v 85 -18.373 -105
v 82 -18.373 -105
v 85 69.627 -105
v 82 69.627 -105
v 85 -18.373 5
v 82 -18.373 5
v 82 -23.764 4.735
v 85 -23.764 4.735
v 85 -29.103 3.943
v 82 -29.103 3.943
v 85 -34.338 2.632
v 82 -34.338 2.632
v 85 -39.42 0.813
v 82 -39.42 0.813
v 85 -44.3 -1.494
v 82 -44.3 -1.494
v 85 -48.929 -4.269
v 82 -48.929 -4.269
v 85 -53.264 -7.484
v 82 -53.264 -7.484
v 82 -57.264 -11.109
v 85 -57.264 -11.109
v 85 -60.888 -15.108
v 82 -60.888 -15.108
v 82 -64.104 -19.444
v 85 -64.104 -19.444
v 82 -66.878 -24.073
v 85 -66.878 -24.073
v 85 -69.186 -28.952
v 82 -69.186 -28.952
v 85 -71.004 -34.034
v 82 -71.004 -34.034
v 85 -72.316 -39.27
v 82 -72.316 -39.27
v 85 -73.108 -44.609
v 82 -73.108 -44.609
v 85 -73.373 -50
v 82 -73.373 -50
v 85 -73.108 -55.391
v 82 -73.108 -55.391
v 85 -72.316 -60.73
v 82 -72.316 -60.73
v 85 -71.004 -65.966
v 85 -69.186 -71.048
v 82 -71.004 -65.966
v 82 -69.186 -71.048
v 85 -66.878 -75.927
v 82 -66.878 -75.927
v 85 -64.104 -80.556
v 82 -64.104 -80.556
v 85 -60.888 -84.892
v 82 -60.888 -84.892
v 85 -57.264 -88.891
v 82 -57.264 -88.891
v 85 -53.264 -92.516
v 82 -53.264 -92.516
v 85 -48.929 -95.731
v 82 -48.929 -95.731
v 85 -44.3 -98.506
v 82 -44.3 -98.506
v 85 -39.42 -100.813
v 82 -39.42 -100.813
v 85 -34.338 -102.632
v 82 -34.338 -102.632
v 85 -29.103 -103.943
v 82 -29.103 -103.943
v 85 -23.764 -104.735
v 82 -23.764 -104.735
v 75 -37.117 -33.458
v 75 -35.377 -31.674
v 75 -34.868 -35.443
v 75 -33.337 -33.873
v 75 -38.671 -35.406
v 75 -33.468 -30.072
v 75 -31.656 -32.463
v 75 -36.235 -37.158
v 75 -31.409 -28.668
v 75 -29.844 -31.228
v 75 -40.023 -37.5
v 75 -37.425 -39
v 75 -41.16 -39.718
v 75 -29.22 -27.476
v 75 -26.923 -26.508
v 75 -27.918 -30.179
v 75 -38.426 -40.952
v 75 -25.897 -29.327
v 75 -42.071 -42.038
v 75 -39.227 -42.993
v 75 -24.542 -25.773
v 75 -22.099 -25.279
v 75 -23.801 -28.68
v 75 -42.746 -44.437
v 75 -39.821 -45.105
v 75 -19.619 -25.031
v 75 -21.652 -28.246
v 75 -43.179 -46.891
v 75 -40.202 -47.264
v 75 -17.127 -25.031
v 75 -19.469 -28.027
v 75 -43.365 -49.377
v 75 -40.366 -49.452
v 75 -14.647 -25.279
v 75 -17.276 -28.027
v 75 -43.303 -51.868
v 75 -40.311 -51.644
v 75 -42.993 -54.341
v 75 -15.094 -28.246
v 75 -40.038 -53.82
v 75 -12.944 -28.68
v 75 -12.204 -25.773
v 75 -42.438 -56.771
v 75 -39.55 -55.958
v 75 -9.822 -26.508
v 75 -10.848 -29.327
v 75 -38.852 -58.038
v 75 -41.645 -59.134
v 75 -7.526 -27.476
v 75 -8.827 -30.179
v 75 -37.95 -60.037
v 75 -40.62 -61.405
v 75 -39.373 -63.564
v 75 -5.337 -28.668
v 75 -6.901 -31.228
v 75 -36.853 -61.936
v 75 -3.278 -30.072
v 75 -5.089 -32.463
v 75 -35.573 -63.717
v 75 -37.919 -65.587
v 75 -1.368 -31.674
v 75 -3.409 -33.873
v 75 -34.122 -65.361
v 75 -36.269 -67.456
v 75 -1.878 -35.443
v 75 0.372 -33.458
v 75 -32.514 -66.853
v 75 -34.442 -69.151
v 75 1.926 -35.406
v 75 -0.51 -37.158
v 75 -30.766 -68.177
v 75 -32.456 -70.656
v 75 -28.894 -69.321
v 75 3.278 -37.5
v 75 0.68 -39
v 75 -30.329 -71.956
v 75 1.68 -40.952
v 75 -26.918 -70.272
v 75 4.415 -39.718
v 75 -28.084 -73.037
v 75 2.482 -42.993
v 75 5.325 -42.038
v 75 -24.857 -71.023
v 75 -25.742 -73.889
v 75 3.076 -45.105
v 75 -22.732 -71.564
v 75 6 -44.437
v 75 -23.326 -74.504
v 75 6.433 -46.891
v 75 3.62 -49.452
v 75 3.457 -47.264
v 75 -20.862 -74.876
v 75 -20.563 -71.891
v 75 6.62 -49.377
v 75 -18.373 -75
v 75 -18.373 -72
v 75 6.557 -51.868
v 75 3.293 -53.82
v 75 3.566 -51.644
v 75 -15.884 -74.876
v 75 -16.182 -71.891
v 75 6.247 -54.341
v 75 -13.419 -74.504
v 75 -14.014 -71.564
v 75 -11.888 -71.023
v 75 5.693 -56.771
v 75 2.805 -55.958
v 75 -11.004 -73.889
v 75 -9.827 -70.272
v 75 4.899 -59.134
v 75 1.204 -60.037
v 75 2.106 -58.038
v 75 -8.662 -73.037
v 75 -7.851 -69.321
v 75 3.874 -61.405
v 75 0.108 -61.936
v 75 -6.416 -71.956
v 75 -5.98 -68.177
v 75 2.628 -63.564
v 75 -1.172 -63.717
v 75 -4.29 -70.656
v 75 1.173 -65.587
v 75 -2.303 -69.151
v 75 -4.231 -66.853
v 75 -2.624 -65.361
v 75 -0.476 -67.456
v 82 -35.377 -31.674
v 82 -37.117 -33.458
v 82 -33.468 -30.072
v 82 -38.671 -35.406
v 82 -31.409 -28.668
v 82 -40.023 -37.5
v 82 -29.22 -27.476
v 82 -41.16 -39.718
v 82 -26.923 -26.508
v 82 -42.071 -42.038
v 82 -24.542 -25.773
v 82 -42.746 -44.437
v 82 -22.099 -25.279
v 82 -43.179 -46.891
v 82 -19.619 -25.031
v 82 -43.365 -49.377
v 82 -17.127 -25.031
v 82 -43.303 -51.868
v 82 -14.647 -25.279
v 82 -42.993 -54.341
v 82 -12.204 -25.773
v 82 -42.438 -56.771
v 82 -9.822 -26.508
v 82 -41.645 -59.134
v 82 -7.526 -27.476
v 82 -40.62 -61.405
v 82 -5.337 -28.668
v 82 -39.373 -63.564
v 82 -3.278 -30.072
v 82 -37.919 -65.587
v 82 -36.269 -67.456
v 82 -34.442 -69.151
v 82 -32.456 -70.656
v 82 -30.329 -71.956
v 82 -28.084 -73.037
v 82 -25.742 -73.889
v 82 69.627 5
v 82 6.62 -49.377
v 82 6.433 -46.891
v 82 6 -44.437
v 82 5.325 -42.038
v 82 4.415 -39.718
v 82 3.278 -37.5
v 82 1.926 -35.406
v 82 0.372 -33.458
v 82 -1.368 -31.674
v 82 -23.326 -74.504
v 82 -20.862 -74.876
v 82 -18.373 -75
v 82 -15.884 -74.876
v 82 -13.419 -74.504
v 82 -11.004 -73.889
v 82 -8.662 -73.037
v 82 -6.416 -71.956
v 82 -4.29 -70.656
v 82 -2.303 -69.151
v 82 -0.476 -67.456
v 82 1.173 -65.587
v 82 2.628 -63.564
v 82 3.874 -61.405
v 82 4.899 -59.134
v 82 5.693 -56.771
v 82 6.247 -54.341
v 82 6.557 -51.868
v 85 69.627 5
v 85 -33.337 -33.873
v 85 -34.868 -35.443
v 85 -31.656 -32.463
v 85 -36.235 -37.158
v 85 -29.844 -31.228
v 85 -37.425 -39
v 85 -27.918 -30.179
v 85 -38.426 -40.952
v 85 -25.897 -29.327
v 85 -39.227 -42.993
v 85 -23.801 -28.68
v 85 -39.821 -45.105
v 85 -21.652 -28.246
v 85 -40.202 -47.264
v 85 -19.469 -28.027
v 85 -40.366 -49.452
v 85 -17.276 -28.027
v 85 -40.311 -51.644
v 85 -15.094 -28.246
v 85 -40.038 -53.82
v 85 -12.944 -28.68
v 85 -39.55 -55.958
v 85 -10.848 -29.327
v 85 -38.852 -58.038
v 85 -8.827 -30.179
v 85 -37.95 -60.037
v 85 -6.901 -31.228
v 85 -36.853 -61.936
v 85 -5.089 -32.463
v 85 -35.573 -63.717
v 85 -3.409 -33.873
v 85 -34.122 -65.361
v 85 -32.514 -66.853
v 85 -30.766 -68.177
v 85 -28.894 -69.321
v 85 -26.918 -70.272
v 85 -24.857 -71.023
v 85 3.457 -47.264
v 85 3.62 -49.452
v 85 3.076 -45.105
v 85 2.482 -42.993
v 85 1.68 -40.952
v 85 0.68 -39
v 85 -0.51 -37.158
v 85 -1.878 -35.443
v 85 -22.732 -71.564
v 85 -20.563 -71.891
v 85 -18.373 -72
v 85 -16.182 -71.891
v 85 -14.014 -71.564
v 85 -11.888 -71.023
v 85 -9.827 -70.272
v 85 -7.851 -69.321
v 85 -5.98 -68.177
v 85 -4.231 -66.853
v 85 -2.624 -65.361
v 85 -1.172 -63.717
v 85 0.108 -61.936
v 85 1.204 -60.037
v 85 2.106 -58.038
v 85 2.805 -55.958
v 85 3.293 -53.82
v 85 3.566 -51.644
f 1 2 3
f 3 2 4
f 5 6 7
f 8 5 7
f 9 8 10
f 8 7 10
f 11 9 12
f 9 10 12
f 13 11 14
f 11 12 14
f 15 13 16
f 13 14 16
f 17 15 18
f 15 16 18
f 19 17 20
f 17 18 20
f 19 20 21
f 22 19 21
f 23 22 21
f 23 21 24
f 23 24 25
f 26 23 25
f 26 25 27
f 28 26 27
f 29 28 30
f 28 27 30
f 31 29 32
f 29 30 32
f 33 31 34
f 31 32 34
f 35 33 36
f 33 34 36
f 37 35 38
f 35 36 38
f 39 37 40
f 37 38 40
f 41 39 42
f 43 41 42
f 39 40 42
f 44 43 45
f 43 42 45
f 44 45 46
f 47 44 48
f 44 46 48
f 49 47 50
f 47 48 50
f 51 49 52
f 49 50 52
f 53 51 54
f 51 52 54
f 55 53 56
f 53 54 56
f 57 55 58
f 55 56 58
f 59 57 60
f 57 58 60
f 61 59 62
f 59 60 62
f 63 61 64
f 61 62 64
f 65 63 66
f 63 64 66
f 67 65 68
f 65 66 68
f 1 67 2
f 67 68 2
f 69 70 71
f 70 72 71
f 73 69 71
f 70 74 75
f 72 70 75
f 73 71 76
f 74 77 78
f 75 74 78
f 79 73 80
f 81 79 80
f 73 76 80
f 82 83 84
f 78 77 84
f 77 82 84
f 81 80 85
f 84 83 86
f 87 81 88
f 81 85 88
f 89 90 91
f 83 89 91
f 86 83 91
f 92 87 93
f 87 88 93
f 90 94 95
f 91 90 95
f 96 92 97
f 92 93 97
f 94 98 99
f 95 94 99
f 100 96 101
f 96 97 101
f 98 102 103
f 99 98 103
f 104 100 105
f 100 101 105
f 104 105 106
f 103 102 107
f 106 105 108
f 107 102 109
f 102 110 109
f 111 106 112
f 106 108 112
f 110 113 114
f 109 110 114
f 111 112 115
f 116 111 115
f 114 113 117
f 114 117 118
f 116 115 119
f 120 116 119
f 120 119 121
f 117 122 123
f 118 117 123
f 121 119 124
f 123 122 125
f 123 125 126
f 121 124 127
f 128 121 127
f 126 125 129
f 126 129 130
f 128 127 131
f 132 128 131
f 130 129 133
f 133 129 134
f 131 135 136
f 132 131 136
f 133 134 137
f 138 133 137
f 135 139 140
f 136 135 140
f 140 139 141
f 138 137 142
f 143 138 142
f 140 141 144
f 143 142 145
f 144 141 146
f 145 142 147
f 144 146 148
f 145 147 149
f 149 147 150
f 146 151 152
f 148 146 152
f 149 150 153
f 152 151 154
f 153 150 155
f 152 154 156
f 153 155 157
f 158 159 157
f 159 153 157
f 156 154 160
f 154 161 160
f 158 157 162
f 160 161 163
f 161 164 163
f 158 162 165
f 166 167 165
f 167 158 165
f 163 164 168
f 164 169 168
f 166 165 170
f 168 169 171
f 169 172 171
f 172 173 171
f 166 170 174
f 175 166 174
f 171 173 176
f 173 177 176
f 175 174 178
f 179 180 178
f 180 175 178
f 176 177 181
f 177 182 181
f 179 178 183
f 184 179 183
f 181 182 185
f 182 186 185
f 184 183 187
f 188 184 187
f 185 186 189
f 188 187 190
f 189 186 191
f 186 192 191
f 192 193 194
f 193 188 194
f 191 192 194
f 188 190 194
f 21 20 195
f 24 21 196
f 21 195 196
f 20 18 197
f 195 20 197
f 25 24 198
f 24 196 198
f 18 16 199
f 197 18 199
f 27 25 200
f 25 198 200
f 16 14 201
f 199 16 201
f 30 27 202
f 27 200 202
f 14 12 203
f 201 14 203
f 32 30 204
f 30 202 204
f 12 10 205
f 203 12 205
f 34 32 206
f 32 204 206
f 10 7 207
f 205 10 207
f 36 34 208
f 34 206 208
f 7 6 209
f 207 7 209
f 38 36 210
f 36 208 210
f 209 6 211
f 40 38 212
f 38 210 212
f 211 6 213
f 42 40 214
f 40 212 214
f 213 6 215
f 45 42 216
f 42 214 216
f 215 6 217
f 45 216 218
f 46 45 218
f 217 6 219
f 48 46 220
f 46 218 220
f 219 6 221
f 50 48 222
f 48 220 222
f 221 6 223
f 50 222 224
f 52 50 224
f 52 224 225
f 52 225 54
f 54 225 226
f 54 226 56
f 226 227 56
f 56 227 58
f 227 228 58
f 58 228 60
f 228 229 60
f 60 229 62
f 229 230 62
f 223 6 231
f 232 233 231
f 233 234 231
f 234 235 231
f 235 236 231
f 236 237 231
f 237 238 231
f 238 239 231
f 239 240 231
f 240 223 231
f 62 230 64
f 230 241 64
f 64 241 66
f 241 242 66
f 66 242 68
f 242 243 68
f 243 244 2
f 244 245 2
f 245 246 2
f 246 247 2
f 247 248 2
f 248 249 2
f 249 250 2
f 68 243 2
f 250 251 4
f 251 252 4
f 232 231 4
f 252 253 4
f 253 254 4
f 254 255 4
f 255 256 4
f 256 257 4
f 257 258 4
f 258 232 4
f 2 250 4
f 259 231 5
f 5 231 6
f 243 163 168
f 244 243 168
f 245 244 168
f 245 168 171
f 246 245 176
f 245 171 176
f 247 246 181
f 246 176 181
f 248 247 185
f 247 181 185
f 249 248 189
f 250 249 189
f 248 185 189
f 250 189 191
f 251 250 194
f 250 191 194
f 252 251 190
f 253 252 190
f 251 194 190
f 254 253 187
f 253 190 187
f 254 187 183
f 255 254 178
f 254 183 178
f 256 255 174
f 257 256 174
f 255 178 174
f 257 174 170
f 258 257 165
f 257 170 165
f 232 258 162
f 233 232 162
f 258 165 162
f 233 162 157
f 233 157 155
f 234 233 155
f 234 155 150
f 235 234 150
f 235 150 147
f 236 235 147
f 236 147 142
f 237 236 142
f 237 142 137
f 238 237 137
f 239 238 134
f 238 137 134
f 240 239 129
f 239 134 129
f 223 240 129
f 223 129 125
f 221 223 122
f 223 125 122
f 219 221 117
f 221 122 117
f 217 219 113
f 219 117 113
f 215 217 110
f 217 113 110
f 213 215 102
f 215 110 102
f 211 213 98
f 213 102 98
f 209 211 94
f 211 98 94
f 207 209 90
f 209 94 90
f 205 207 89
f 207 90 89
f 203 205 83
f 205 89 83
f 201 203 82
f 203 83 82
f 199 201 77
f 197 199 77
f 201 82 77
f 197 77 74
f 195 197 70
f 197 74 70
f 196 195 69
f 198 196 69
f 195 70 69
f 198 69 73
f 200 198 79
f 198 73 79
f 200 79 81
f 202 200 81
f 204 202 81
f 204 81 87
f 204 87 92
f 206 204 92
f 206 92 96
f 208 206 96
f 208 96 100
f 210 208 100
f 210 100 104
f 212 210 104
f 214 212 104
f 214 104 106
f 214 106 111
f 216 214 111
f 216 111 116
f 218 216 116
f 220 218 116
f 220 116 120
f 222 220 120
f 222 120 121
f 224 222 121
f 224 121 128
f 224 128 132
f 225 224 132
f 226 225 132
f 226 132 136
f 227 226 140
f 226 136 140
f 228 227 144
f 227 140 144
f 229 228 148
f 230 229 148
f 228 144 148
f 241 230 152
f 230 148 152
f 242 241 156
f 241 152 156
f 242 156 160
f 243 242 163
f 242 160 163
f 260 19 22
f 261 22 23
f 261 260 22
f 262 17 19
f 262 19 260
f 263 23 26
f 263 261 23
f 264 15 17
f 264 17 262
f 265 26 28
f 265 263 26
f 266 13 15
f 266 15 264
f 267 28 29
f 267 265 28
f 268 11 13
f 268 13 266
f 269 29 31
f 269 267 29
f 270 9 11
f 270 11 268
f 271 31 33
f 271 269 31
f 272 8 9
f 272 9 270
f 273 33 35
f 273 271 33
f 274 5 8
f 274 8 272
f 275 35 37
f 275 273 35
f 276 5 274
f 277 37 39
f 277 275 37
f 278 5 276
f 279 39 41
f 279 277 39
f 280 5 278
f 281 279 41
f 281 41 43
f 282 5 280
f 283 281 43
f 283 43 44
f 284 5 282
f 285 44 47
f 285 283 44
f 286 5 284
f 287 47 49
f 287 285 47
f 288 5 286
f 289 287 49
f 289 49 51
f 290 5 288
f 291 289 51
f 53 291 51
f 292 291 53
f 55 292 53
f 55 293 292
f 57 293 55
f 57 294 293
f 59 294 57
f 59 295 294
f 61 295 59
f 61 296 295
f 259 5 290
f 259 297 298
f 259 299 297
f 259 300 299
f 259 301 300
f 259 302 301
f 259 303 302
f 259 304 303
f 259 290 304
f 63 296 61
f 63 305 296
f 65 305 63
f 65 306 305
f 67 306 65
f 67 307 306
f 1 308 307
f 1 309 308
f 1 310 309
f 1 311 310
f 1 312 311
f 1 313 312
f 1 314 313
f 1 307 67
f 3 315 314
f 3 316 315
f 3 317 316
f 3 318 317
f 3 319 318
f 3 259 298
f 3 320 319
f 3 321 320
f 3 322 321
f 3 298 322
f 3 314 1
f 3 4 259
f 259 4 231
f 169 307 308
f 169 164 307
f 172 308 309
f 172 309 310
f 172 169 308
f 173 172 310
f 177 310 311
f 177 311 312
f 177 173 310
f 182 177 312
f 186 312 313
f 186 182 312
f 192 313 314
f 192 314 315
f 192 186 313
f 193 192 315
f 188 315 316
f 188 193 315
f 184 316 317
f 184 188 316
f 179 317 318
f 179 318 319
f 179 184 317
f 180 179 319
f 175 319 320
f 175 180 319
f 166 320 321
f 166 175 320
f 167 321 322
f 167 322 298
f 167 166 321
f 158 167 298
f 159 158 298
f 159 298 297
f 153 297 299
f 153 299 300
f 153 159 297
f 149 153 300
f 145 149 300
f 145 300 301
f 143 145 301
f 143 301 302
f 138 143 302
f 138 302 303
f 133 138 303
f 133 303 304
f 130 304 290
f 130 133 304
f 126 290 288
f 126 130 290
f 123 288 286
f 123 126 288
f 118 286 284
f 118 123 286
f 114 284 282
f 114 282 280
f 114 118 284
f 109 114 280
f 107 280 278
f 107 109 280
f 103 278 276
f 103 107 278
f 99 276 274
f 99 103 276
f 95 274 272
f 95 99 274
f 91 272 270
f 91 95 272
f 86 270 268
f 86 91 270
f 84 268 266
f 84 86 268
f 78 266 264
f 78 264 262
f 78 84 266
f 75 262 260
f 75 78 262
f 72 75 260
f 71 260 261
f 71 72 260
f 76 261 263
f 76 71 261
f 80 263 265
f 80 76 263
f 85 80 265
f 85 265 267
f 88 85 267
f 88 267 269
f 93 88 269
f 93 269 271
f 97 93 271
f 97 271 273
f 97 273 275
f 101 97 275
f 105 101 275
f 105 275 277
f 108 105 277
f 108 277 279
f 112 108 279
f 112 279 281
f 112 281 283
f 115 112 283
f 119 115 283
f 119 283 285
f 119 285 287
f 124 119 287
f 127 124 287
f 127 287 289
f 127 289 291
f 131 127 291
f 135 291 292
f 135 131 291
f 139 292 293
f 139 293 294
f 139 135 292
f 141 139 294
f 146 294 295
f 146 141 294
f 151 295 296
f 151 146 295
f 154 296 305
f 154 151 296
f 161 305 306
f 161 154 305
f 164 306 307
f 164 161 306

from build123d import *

# Parameters (mm, degrees)
BEARING_START             = 1
SKETCH1_R                 = 25
SKETCH1_R_2               = 22
BEARING_RING_INSERT_DEPTH = 7
SKETCH2_R                 = 22
BULK_EXTRUDE_DEPTH        = 3


with BuildPart() as part:
    # Sketch1 → BEARING RING INSERT (new body)
    with BuildSketch(Plane(origin=(74, 0, 0), x_dir=(0, 0, -1), z_dir=(1, 0, 0)).offset(BEARING_START)):
        with Locations((50, -18.372727273)):
            Circle(SKETCH1_R)
        with Locations((50, -18.372727273)):
            Circle(SKETCH1_R_2, mode=Mode.SUBTRACT)
    extrude(amount=BEARING_RING_INSERT_DEPTH)

    # Sketch2 → BULK EXTRUDE (add)
    with BuildSketch(Plane(origin=(82, 0, 0), x_dir=(0, 0, -1), z_dir=(1, 0, 0))):
        with BuildLine():
            Line((105, -18.372727273), (105, 69.627272727))
            Line((105, 69.627272727), (-5, 69.627272727))
            Line((-5, 69.627272727), (-5, -18.372727273))
            ThreePointArc((-5, -18.372727273), (50, -73.372727273), (105, -18.372727273))
        make_face()
        with Locations((50, -18.372727273)):
            Circle(SKETCH2_R, mode=Mode.SUBTRACT)
    extrude(amount=BULK_EXTRUDE_DEPTH)


solid = part.part
